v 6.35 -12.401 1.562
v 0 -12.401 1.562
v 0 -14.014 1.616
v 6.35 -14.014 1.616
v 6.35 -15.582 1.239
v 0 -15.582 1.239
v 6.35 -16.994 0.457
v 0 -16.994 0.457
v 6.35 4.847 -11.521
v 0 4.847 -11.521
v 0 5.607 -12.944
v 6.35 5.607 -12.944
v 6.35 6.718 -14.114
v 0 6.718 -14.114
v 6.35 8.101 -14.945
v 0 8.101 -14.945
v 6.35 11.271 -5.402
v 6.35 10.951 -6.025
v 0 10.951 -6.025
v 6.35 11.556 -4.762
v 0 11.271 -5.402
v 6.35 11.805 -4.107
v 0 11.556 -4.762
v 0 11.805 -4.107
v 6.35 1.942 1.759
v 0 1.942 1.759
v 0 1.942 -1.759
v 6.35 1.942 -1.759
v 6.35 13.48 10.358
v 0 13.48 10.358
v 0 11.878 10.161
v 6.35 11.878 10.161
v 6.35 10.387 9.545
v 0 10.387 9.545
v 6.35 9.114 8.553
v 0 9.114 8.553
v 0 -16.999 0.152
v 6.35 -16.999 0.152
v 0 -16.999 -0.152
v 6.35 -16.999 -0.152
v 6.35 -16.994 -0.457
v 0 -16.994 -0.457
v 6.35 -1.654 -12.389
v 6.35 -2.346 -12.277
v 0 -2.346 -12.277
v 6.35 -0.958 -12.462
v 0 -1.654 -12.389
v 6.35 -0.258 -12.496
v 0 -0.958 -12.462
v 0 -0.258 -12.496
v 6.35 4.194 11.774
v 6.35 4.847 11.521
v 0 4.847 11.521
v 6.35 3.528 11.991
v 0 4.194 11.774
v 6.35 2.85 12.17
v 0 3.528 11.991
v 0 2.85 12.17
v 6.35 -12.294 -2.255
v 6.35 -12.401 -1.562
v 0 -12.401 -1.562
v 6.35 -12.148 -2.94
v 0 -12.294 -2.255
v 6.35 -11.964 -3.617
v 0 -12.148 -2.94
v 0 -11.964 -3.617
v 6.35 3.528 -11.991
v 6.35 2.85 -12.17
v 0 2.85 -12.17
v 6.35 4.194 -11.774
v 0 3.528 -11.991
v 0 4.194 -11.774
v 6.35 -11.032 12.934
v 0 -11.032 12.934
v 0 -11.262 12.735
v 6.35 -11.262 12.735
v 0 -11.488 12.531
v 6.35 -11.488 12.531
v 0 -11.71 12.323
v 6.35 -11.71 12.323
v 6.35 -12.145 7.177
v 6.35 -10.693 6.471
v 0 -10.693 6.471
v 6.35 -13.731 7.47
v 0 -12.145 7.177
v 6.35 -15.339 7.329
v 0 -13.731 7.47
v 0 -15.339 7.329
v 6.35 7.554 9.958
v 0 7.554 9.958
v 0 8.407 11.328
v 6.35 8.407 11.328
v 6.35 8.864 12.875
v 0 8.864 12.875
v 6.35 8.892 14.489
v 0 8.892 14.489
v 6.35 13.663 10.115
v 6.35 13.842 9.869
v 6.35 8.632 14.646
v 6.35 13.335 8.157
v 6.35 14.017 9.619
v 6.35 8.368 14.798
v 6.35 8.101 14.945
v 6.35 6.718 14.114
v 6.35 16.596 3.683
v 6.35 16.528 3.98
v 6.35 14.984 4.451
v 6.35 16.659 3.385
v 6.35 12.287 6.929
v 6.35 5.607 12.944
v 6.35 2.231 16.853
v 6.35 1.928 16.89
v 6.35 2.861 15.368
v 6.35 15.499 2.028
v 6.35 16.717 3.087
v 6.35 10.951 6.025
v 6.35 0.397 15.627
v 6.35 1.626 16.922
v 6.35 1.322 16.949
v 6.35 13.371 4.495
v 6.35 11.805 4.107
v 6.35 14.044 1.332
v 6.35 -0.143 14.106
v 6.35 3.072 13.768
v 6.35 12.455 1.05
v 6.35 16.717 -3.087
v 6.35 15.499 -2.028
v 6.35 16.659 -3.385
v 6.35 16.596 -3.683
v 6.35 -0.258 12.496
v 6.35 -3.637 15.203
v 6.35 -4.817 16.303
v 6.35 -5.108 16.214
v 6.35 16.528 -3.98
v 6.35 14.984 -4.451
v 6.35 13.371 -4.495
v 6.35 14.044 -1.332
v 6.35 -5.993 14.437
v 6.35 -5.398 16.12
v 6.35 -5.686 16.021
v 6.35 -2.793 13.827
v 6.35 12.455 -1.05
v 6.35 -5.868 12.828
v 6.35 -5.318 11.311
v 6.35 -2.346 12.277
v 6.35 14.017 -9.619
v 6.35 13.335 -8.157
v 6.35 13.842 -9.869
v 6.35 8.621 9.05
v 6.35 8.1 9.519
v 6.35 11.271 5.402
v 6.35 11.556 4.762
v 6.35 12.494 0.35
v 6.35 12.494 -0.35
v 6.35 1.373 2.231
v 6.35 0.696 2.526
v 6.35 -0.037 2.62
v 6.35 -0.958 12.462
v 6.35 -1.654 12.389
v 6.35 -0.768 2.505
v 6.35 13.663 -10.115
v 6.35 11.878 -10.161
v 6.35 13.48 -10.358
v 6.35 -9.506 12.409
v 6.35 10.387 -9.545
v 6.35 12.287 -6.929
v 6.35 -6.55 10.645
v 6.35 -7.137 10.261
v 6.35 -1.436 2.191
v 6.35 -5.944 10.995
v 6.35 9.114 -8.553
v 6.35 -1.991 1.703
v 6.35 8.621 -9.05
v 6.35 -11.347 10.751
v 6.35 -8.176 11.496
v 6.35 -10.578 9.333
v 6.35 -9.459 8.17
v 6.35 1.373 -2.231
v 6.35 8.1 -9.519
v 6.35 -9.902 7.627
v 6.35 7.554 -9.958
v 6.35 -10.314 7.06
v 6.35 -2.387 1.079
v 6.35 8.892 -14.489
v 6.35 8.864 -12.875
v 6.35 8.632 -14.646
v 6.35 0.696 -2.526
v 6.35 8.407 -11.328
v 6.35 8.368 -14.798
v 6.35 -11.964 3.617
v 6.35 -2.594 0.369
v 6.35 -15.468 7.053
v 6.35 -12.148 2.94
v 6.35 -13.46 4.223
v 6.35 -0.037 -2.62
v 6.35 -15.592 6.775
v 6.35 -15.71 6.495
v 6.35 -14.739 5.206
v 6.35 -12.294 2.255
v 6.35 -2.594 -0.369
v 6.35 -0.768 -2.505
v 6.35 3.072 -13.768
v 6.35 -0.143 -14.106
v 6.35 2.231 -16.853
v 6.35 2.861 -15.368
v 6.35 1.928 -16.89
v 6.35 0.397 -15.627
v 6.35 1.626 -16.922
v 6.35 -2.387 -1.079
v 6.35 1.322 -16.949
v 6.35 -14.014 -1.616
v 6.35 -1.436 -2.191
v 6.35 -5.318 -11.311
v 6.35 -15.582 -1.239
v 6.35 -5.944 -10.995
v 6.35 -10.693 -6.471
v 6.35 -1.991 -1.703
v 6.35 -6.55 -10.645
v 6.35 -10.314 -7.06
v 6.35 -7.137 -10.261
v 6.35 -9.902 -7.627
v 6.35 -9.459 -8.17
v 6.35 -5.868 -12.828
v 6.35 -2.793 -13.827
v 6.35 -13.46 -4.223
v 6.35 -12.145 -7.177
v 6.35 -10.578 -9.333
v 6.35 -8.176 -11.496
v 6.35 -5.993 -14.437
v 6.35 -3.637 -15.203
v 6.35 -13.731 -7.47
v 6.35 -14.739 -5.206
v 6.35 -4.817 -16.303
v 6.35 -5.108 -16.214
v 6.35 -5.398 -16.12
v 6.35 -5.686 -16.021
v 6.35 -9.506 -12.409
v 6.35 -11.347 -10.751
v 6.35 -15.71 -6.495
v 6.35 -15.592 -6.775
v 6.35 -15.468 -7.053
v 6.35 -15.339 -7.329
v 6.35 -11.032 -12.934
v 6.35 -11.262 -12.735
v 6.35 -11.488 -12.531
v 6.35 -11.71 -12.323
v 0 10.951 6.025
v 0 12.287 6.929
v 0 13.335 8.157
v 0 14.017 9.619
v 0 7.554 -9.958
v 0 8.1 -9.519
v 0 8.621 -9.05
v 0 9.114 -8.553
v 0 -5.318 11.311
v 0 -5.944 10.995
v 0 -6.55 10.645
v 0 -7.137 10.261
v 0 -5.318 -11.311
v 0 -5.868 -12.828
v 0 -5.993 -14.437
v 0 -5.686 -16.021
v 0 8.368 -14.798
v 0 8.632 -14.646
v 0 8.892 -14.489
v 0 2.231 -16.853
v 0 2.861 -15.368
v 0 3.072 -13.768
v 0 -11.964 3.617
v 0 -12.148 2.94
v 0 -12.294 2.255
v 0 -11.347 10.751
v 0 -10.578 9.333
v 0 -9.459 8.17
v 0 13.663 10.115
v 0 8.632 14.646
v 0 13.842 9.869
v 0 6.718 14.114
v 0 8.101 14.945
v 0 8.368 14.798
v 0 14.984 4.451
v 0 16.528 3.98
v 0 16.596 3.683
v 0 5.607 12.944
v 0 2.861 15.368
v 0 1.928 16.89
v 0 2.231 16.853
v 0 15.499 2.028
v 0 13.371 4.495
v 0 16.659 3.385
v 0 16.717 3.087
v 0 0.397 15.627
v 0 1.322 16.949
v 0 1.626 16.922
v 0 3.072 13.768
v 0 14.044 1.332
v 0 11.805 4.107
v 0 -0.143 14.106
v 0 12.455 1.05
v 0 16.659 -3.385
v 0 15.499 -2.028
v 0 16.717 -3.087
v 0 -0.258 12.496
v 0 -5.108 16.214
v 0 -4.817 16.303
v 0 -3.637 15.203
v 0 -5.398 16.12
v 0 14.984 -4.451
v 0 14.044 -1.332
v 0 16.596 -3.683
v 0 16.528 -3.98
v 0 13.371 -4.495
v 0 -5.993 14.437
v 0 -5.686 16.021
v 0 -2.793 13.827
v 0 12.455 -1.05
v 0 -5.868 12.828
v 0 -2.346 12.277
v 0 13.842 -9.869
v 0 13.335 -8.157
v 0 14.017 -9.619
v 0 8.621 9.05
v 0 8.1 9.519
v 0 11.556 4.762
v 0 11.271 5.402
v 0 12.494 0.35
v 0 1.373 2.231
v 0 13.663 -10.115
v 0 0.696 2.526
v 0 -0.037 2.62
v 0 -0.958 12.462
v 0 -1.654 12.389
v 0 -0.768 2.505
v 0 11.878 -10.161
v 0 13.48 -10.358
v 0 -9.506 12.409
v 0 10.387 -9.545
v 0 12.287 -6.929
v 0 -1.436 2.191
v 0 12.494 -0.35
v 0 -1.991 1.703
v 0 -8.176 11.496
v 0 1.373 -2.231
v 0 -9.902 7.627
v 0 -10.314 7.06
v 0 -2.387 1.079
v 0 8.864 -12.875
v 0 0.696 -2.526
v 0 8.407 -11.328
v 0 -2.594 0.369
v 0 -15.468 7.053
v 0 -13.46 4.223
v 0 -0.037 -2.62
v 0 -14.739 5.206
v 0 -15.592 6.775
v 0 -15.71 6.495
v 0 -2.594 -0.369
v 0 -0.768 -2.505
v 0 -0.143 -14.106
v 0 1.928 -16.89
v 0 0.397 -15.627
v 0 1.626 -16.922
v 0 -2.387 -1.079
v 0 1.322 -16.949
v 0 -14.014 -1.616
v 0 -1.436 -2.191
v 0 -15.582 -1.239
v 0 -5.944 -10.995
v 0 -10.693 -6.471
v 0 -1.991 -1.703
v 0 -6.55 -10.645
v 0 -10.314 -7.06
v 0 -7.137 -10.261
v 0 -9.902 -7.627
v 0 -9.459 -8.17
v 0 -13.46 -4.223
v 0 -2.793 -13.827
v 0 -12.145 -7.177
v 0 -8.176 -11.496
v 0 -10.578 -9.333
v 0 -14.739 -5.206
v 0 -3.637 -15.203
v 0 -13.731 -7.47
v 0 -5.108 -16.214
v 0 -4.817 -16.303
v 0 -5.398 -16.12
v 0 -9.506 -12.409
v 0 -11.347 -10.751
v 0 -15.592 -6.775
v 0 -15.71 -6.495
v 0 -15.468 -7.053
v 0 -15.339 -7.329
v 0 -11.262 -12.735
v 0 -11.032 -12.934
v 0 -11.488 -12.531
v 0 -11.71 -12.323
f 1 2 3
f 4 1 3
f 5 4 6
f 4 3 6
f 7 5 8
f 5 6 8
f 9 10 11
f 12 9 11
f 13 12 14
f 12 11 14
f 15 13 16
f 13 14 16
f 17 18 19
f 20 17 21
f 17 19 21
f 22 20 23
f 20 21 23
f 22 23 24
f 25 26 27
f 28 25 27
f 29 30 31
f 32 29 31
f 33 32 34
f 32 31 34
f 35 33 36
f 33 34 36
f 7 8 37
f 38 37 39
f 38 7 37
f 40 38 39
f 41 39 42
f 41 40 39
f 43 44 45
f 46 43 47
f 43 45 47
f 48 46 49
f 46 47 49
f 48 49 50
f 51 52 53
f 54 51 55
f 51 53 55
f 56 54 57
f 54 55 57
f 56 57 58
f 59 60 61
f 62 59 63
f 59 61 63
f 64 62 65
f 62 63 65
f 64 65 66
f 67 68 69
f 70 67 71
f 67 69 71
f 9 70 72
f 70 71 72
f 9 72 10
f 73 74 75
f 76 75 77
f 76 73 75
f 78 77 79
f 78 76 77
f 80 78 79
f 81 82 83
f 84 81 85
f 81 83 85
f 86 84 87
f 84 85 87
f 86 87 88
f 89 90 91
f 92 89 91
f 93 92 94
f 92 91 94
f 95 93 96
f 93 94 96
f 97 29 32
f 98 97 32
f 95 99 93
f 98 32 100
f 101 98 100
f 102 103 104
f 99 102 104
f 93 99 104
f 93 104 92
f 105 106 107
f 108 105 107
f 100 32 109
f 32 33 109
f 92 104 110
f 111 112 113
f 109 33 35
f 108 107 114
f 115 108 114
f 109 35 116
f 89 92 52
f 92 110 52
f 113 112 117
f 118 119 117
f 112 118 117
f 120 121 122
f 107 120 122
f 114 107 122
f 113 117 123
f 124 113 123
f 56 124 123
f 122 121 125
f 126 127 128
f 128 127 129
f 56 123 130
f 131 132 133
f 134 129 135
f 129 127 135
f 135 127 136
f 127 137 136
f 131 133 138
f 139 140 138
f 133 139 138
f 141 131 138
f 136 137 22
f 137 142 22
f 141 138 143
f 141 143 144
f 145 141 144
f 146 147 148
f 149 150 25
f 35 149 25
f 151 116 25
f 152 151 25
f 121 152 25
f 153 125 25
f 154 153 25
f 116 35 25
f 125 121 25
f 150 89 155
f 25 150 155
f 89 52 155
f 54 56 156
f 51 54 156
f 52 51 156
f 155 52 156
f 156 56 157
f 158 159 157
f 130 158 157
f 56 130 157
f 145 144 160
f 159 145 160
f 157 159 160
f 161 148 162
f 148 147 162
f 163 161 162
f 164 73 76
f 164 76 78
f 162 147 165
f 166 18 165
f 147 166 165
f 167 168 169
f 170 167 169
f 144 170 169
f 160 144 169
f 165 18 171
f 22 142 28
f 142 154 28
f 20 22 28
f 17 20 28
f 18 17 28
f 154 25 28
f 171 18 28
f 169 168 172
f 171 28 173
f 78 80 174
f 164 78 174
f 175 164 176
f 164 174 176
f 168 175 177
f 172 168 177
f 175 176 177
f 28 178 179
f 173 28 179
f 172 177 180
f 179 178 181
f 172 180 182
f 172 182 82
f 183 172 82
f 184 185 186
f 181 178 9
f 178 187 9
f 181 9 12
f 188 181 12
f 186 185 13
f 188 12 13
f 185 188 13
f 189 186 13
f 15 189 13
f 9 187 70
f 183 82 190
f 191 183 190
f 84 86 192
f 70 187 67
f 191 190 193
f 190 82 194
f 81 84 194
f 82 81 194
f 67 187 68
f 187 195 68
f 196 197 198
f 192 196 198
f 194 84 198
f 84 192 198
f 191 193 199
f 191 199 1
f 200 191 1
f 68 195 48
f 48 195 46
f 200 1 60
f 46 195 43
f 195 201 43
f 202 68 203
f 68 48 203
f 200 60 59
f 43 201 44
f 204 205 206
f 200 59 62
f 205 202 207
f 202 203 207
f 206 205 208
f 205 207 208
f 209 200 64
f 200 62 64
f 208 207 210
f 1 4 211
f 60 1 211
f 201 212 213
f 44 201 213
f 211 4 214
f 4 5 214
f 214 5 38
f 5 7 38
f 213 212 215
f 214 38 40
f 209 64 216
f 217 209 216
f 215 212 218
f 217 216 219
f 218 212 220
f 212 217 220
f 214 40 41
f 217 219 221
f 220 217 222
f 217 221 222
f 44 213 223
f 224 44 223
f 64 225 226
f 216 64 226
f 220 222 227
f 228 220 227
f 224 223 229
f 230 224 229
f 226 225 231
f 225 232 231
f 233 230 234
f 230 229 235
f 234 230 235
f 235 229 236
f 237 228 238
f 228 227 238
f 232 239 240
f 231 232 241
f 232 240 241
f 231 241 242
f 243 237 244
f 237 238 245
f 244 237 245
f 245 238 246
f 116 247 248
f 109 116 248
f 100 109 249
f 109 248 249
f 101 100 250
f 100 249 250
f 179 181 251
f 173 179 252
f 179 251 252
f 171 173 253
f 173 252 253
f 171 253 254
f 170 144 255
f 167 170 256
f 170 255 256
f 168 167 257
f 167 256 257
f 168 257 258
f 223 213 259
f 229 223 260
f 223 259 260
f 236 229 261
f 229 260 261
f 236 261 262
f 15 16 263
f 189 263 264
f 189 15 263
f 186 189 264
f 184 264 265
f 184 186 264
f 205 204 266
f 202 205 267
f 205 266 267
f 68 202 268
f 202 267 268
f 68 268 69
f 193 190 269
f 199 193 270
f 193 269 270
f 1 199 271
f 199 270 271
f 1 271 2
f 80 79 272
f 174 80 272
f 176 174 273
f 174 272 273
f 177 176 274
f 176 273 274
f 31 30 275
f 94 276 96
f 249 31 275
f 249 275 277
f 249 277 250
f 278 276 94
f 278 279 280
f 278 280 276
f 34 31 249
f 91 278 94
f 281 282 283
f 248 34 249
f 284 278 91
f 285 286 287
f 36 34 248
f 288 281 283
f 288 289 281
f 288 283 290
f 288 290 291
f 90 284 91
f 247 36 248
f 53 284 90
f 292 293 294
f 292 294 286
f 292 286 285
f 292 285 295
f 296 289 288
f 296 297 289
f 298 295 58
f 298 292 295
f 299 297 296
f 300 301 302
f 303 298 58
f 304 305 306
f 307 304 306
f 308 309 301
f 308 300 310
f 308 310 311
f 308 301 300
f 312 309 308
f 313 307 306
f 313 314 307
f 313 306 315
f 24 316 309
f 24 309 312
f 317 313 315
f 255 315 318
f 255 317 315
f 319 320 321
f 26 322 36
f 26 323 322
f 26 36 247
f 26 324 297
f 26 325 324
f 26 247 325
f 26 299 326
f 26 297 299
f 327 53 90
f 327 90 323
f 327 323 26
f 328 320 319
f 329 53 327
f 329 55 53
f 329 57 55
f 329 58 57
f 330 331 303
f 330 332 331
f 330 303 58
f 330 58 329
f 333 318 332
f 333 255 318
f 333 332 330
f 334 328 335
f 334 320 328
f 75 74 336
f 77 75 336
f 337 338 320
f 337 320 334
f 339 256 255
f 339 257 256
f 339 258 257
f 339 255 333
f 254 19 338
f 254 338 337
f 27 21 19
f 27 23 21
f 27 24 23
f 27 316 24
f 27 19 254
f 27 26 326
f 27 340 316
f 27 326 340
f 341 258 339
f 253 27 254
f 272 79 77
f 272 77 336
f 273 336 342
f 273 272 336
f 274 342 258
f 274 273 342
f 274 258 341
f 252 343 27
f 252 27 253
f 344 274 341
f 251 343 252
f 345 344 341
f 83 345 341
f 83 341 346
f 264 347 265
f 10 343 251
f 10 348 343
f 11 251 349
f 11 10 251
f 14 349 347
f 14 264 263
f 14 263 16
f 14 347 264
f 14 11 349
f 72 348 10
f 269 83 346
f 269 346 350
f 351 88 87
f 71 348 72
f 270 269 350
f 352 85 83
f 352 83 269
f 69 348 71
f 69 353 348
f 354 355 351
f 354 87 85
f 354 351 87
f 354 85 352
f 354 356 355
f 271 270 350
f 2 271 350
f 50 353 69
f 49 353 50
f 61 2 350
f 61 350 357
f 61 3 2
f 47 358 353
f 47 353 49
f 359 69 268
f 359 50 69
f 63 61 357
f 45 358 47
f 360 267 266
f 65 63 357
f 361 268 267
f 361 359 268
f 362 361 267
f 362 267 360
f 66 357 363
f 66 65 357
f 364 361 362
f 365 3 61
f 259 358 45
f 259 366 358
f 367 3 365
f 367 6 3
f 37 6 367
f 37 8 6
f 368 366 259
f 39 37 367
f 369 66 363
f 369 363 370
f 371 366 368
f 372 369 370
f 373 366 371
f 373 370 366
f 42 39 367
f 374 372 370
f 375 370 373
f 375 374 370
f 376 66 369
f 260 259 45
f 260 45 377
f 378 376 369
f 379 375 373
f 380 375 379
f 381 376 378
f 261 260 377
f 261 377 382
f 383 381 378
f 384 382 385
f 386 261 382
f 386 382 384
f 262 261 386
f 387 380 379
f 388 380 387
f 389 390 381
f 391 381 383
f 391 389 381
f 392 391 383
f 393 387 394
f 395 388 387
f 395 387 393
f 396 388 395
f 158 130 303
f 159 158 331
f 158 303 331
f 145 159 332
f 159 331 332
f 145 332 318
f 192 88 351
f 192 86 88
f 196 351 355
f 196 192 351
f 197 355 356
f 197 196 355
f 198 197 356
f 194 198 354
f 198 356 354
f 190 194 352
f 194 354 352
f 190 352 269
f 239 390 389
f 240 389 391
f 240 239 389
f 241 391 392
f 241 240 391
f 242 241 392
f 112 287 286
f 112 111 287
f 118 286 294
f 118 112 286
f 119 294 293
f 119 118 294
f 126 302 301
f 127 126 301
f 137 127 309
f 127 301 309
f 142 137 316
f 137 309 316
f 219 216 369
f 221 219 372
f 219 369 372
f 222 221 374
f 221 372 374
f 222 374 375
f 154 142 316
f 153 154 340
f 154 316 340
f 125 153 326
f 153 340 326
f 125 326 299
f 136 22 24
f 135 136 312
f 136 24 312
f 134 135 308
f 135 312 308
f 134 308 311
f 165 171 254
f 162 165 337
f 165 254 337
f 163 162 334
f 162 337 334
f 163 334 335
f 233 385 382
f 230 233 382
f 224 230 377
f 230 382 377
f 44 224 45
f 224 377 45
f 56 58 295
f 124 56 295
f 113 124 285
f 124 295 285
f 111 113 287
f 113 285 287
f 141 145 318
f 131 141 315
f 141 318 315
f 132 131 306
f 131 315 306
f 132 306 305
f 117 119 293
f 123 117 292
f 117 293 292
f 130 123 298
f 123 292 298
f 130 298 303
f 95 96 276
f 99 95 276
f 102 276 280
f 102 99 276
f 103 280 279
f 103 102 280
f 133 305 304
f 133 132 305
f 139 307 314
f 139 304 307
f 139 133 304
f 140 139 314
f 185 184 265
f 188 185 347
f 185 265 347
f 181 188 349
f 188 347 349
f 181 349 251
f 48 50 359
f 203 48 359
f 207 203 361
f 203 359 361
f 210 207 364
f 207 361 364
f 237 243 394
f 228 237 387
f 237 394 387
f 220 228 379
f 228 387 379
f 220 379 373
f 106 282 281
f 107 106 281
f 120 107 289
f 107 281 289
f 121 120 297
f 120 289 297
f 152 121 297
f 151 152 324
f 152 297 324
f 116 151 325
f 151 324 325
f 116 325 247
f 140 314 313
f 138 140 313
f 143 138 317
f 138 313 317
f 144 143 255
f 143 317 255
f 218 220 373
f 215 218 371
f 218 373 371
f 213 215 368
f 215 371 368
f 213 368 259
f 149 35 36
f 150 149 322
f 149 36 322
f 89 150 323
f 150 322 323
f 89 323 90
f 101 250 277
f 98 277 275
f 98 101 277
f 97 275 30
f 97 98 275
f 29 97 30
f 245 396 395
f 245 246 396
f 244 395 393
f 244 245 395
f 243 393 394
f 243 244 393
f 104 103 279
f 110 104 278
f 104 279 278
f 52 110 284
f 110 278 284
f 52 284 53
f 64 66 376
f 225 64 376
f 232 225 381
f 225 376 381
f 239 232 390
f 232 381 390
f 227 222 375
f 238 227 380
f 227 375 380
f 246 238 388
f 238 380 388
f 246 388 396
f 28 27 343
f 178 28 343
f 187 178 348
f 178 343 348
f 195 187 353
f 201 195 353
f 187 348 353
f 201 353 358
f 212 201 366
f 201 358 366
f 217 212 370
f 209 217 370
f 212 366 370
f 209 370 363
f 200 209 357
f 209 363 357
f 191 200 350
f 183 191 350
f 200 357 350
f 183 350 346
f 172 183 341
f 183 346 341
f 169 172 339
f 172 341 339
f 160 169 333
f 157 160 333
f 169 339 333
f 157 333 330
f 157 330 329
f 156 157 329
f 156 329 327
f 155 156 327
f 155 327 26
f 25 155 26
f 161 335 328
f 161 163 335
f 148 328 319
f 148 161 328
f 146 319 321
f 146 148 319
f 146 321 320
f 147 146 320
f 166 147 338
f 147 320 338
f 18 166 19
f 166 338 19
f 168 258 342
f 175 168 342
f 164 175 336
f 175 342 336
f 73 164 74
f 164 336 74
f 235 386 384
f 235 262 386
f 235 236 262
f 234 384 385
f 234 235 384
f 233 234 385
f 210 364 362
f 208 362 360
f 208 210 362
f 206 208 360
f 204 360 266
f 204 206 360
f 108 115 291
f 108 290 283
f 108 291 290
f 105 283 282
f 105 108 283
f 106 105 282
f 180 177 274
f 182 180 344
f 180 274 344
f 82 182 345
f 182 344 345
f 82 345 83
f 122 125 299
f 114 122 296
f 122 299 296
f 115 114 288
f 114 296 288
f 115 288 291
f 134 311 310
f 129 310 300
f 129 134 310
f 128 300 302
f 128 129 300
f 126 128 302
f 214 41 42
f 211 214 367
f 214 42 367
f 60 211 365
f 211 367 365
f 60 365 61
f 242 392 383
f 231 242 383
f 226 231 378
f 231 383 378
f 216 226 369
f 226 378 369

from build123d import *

# Parameters (mm, degrees)
BASPROSKE_W        = 6.35
BASPROSKE_H        = 17
TOOTHCUT_DEPTH     = 25.86609137
TEETHCUTS_COUNT    = 15
BORSKE_R           = 0.4
BORE_DEPTH         = 50.0000508
CUT_EXTRUDE1_REACH = 26.831


with BuildPart() as part:
    # BasProSke → Base-Revolve (revolve)
    with BuildSketch(Plane(origin=(0, 0, 0), x_dir=(1, 0, 0), z_dir=(0, 1, 0)), mode=Mode.PRIVATE) as base_revolve_sk:
        with Locations((3.175, 8.5)):
            Rectangle(BASPROSKE_W, BASPROSKE_H)
    revolve(base_revolve_sk.sketch.rotate(Axis((-10, 0, 0), (1, 0, 0)), 180), axis=Axis((-10, 0, 0), (1, 0, 0)))

    # TooCutSke → ToothCut (cut, through all)
    with BuildSketch(Plane(origin=(0, 0, 0), x_dir=(0, 0, -1), z_dir=(1, 0, 0))):
        with BuildLine():
            ThreePointArc((1.050056448, 12.454813626), (0, 12.499), (-1.050056448, 12.454813626))
            ThreePointArc((-1.050056448, 12.454813626), (-1.638118106, 14.809604533), (-3.110934279, 16.73876737))
            ThreePointArc((-3.110934279, 16.73876737), (0, 17.0254), (3.110934279, 16.73876737))
            ThreePointArc((3.110934279, 16.73876737), (1.638118106, 14.809604533), (1.050056448, 12.454813626))
        make_face()
    toothcut = extrude(amount=TOOTHCUT_DEPTH, mode=Mode.SUBTRACT)

    # TeethCuts: ToothCut ×15 about axis
    teethcuts_axis = Axis((0, 0, 0), (1, 0, 0))
    for i in range(1, TEETHCUTS_COUNT):
        add(toothcut.rotate(teethcuts_axis, i * 360 / TEETHCUTS_COUNT), mode=Mode.SUBTRACT)

    # BorSke → Bore (cut, symmetric)
    with BuildSketch(Plane(origin=(0, 0, 0), x_dir=(0, 0, -1), z_dir=(1, 0, 0))):
        with Locations(Location((0, 0, 0), (0, 0, 180))):
            Circle(BORSKE_R)
    extrude(amount=BORE_DEPTH, both=True, mode=Mode.SUBTRACT)

    # Sketch1 → Cut-Extrude1 (cut, up to next)
    with BuildSketch(Plane.ZY, mode=Mode.PRIVATE) as cut_extrude1_sk1:
        with BuildLine():
            Line((1.659895813, 1.69164), (-1.659895813, 1.69164))
            ThreePointArc((-1.659895813, 1.69164), (-0.917318626, -2.185274934), (2.37, 0))
            ThreePointArc((2.37, 0), (2.185274934, 0.917318626), (1.659895813, 1.69164))
        make_face()
    cut_extrude1_tool1 = extrude(cut_extrude1_sk1.sketch, amount=-CUT_EXTRUDE1_REACH, mode=Mode.PRIVATE) & part.part
    # Sketch1 → Cut-Extrude1 (cut, up to next)
    with BuildSketch(Plane.ZY, mode=Mode.PRIVATE) as cut_extrude1_sk2:
        with BuildLine():
            ThreePointArc((-1.75910037, 1.94164), (0, -2.62), (1.75910037, 1.94164))
            Line((1.75910037, 1.94164), (-1.75910037, 1.94164))
        make_face()
    cut_extrude1_tool2 = extrude(cut_extrude1_sk2.sketch, amount=-CUT_EXTRUDE1_REACH, mode=Mode.PRIVATE) & part.part
    add(cut_extrude1_tool1.solids().sort_by_distance((0, -0.189427, 0))[0], mode=Mode.SUBTRACT)
    add(cut_extrude1_tool2.solids().sort_by_distance((0, -0.182106, 0))[0], mode=Mode.SUBTRACT)


solid = part.part
